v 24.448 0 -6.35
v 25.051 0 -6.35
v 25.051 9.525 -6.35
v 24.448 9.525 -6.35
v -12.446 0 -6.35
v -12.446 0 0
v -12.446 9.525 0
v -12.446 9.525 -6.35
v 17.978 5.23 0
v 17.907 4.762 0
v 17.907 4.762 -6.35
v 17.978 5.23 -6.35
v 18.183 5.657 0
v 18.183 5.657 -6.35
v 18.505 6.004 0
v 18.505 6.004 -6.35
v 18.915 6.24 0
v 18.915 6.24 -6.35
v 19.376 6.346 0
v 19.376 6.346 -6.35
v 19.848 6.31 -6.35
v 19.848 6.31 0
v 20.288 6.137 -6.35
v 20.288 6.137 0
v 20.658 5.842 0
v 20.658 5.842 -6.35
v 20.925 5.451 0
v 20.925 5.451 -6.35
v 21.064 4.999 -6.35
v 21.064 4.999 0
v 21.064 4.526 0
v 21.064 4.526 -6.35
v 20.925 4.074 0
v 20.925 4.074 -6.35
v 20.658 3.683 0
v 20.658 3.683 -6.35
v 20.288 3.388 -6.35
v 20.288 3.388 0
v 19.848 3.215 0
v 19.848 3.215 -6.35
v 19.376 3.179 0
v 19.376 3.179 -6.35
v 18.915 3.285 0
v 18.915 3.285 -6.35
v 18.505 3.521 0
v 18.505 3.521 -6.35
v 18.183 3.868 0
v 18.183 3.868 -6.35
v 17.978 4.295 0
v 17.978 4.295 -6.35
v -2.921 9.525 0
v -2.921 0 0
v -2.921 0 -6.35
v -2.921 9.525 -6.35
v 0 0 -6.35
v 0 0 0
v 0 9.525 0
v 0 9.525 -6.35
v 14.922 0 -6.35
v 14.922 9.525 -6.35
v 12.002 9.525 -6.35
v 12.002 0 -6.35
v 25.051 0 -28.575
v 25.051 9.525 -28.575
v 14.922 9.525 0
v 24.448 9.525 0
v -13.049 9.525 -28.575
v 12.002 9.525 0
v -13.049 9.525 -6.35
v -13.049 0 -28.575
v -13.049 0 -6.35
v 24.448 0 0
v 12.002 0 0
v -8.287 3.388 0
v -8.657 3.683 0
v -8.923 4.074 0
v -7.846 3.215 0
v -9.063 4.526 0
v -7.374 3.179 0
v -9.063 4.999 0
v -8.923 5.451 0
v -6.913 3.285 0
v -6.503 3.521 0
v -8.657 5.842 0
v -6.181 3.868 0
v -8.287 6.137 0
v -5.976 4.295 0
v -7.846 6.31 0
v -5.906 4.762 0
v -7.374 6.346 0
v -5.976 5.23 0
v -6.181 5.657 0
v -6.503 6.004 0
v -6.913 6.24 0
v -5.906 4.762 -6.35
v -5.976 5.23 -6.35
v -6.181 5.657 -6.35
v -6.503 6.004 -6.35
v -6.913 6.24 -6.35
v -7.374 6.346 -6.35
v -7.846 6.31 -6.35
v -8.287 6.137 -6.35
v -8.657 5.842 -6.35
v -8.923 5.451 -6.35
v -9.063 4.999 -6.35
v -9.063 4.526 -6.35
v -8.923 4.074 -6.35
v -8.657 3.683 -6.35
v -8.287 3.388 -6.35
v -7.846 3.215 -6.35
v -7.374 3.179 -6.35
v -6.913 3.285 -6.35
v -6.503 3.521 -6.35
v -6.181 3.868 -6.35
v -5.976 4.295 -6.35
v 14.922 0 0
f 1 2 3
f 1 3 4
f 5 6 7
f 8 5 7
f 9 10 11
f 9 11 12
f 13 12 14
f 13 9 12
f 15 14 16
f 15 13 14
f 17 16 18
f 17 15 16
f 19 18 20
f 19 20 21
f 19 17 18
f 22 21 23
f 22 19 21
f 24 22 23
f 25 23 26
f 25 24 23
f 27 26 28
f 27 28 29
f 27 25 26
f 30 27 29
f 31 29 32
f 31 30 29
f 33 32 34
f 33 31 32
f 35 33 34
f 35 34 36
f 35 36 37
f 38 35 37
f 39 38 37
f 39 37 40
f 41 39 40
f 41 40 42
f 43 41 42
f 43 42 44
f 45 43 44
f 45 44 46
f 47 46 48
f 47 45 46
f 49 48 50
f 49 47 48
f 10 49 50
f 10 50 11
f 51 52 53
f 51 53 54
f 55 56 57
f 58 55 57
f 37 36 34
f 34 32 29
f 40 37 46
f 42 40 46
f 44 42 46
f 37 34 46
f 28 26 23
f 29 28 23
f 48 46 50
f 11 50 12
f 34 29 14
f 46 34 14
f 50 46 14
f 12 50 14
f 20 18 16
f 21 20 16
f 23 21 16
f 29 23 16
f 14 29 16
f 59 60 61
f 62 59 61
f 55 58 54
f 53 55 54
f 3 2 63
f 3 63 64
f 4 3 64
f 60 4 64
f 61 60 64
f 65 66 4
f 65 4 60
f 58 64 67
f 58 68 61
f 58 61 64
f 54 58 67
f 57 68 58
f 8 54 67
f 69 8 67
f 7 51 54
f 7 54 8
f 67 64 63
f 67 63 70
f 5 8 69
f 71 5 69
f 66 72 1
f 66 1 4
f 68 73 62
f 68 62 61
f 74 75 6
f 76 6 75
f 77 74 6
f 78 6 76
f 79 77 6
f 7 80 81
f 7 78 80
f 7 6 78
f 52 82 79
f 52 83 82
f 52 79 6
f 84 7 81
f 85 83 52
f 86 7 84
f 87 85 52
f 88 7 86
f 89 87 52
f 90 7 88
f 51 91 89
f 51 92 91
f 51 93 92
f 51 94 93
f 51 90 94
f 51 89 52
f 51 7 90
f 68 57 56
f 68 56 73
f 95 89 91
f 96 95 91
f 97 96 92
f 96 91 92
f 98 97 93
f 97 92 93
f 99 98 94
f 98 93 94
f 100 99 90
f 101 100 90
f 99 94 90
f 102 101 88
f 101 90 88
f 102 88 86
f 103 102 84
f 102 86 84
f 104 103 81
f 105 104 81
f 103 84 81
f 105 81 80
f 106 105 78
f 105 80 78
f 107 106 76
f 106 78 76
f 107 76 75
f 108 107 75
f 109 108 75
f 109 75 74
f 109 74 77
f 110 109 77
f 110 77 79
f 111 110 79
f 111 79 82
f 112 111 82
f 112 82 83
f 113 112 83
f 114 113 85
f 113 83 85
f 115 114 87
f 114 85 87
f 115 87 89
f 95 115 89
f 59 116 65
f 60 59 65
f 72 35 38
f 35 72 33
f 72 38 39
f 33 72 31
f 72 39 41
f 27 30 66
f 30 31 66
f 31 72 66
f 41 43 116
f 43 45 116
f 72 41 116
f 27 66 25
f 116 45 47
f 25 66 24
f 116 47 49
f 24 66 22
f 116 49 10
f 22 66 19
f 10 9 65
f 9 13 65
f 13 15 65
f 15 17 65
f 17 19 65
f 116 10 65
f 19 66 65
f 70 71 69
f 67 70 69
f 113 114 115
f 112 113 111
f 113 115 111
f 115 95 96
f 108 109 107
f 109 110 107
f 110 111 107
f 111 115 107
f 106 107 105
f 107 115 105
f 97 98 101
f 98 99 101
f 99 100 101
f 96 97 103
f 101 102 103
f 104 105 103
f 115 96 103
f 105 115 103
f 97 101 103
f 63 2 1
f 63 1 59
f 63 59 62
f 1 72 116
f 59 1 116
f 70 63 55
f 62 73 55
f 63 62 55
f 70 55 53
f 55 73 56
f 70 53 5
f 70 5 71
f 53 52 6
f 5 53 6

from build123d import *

# Parameters (mm, degrees)
SKETCH1_W           = 12.0015
SKETCH1_H           = 9.525
BOSS_EXTRUDE3_DEPTH = 6.35
SKETCH4_W           = 38.1
SKETCH4_H           = 9.525
BOSS_EXTRUDE4_DEPTH = 22.225
SKETCH2_W           = 9.525
SKETCH2_H           = 9.525
SKETCH2_R           = 1.5875
BOSS_EXTRUDE5_DEPTH = 6.35


with BuildPart() as part:
    # Sketch1 → Boss-Extrude3 (new body)
    with BuildSketch(Plane.XY):
        with Locations((6.00075, 4.7625)):
            Rectangle(SKETCH1_W, SKETCH1_H)
    extrude(amount=-BOSS_EXTRUDE3_DEPTH)

    # Sketch4 → Boss-Extrude4 (add)
    with BuildSketch(Plane(origin=(0, 0, -6.35), x_dir=(-1, 0, 0), z_dir=(0, 0, -1))):
        with Locations((-6.00075, 4.7625)):
            Rectangle(SKETCH4_W, SKETCH4_H)
    extrude(amount=BOSS_EXTRUDE4_DEPTH)

    # Sketch2 → Boss-Extrude5 (add)
    with BuildSketch(Plane.XY):
        with Locations((-7.6835, 4.7625)):
            Rectangle(SKETCH2_W, SKETCH2_H)
        with Locations((-7.493, 4.7625)):
            Circle(SKETCH2_R, mode=Mode.SUBTRACT)
    boss_extrude5 = extrude(amount=-BOSS_EXTRUDE5_DEPTH)

    # Mirror8: Boss-Extrude5 across plane
    add(boss_extrude5.mirror(Plane(origin=(6.00075, 0, 0), x_dir=(0, 0, 1), z_dir=(1, 0, 0))))


solid = part.part
